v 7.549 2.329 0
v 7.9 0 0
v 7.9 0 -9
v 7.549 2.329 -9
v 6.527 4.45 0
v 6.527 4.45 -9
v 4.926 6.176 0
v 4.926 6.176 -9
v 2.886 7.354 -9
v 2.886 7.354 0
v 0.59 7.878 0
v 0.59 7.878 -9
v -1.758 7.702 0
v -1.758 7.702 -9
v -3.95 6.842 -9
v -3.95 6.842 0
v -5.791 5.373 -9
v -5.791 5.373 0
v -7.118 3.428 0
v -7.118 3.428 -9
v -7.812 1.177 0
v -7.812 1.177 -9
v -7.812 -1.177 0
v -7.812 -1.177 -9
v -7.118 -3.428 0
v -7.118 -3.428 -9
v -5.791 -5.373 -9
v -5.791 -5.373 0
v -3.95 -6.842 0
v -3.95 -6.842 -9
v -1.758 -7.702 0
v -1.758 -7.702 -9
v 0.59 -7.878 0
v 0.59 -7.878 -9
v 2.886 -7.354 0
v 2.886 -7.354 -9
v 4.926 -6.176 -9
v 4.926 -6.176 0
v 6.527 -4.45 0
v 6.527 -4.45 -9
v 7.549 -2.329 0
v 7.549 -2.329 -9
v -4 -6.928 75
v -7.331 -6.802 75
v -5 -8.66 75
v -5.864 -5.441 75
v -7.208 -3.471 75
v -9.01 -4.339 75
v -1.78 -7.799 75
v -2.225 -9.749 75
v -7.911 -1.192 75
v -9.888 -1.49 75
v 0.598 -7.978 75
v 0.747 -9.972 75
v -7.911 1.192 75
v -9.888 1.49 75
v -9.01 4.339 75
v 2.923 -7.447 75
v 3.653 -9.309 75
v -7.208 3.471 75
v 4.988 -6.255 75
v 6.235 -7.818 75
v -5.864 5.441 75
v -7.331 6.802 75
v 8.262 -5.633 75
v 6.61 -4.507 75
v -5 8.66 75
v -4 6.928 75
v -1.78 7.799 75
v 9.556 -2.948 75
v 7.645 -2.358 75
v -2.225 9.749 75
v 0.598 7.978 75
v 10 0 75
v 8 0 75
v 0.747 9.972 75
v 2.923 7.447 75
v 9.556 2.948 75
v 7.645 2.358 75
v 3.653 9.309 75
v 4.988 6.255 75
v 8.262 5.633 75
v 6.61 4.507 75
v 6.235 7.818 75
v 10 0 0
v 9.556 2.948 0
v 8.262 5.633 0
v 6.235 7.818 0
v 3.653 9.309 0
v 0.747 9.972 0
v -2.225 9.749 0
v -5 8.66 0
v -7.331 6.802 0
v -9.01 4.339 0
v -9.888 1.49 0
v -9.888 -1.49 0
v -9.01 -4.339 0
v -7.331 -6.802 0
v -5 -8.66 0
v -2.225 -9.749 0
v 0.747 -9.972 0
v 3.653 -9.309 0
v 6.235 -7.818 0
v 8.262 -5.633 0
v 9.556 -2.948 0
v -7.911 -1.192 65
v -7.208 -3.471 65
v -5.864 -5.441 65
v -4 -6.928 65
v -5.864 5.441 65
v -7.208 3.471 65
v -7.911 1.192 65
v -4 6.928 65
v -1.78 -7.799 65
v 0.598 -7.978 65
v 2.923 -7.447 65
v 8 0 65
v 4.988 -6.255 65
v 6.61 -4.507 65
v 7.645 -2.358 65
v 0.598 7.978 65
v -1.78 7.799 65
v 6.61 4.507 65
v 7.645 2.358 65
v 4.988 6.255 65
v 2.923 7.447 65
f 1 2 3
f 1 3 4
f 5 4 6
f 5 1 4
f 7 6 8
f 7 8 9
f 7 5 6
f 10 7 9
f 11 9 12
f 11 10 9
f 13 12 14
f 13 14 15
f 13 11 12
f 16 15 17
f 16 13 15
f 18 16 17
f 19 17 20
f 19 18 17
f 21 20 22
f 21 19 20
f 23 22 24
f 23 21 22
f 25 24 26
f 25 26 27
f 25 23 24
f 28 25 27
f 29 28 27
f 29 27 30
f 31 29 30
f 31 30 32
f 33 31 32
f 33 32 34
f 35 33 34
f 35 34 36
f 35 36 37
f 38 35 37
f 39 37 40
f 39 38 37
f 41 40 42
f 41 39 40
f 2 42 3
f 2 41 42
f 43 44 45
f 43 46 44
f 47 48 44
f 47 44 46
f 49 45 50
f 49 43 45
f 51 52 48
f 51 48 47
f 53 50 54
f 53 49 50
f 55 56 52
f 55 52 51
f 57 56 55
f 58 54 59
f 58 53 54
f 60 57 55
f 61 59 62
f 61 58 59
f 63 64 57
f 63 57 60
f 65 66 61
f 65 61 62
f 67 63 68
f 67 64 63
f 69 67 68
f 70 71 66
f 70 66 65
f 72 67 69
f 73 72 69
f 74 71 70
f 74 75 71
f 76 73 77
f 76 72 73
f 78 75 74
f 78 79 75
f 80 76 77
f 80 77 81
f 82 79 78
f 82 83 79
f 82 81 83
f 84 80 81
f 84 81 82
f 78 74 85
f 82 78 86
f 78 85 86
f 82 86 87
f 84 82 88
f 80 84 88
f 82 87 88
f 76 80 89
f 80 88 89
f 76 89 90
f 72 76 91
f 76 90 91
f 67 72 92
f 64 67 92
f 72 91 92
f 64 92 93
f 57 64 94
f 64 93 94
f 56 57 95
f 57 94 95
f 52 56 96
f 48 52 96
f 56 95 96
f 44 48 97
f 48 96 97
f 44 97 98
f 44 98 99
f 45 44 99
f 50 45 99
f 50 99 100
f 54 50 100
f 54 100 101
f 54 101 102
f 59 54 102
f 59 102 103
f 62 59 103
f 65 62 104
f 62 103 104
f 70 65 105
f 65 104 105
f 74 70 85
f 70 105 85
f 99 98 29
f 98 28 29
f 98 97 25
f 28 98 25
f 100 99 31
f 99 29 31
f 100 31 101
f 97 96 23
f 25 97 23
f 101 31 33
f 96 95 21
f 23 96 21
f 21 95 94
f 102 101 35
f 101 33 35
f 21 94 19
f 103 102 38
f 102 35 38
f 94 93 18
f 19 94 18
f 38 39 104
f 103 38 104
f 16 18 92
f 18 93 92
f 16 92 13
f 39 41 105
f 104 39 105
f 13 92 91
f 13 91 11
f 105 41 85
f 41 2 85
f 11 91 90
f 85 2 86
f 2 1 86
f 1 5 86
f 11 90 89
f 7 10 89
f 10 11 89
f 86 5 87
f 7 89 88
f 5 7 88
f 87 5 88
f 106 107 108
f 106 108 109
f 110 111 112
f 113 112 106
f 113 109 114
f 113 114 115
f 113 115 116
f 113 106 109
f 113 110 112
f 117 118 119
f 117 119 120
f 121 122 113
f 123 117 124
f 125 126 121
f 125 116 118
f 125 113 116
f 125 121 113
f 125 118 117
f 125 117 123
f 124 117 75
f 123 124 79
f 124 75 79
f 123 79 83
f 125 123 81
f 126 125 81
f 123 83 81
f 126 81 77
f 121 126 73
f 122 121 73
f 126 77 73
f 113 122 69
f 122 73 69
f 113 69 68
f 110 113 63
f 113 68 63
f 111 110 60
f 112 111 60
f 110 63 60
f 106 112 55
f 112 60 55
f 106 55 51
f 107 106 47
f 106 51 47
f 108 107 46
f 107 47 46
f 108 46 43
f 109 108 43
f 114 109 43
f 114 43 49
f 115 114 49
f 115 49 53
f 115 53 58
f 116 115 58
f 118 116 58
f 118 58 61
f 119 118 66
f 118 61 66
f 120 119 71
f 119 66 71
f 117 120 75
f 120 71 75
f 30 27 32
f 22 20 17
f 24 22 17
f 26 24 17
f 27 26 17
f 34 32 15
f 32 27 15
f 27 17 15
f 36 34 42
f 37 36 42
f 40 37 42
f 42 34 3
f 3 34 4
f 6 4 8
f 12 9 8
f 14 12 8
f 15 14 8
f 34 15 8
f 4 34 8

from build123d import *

# Parameters (mm, degrees)
F0_R     = 10
F0_R_2   = 7.9
F1_DEPTH = 75
F2_DEPTH = 9
F3_R     = 8
F4_DEPTH = 10


with BuildPart() as f1:
    # F0 (on Top) → F1 (new body)
    with BuildSketch(Plane.XY):
        Circle(F0_R)
        Circle(F0_R_2, mode=Mode.SUBTRACT)
        Circle(F0_R_2)
    extrude(amount=F1_DEPTH)

    # F0 (on Top) → F2 (join)
    with BuildSketch(Plane.XY):
        Circle(F0_R_2)
    extrude(amount=-F2_DEPTH)

    # F3 (on face) → F4 (cut)
    with BuildSketch(Plane.XY.offset(75)):
        Circle(F3_R)
    extrude(amount=-F4_DEPTH, mode=Mode.SUBTRACT)


solid = f1.part
